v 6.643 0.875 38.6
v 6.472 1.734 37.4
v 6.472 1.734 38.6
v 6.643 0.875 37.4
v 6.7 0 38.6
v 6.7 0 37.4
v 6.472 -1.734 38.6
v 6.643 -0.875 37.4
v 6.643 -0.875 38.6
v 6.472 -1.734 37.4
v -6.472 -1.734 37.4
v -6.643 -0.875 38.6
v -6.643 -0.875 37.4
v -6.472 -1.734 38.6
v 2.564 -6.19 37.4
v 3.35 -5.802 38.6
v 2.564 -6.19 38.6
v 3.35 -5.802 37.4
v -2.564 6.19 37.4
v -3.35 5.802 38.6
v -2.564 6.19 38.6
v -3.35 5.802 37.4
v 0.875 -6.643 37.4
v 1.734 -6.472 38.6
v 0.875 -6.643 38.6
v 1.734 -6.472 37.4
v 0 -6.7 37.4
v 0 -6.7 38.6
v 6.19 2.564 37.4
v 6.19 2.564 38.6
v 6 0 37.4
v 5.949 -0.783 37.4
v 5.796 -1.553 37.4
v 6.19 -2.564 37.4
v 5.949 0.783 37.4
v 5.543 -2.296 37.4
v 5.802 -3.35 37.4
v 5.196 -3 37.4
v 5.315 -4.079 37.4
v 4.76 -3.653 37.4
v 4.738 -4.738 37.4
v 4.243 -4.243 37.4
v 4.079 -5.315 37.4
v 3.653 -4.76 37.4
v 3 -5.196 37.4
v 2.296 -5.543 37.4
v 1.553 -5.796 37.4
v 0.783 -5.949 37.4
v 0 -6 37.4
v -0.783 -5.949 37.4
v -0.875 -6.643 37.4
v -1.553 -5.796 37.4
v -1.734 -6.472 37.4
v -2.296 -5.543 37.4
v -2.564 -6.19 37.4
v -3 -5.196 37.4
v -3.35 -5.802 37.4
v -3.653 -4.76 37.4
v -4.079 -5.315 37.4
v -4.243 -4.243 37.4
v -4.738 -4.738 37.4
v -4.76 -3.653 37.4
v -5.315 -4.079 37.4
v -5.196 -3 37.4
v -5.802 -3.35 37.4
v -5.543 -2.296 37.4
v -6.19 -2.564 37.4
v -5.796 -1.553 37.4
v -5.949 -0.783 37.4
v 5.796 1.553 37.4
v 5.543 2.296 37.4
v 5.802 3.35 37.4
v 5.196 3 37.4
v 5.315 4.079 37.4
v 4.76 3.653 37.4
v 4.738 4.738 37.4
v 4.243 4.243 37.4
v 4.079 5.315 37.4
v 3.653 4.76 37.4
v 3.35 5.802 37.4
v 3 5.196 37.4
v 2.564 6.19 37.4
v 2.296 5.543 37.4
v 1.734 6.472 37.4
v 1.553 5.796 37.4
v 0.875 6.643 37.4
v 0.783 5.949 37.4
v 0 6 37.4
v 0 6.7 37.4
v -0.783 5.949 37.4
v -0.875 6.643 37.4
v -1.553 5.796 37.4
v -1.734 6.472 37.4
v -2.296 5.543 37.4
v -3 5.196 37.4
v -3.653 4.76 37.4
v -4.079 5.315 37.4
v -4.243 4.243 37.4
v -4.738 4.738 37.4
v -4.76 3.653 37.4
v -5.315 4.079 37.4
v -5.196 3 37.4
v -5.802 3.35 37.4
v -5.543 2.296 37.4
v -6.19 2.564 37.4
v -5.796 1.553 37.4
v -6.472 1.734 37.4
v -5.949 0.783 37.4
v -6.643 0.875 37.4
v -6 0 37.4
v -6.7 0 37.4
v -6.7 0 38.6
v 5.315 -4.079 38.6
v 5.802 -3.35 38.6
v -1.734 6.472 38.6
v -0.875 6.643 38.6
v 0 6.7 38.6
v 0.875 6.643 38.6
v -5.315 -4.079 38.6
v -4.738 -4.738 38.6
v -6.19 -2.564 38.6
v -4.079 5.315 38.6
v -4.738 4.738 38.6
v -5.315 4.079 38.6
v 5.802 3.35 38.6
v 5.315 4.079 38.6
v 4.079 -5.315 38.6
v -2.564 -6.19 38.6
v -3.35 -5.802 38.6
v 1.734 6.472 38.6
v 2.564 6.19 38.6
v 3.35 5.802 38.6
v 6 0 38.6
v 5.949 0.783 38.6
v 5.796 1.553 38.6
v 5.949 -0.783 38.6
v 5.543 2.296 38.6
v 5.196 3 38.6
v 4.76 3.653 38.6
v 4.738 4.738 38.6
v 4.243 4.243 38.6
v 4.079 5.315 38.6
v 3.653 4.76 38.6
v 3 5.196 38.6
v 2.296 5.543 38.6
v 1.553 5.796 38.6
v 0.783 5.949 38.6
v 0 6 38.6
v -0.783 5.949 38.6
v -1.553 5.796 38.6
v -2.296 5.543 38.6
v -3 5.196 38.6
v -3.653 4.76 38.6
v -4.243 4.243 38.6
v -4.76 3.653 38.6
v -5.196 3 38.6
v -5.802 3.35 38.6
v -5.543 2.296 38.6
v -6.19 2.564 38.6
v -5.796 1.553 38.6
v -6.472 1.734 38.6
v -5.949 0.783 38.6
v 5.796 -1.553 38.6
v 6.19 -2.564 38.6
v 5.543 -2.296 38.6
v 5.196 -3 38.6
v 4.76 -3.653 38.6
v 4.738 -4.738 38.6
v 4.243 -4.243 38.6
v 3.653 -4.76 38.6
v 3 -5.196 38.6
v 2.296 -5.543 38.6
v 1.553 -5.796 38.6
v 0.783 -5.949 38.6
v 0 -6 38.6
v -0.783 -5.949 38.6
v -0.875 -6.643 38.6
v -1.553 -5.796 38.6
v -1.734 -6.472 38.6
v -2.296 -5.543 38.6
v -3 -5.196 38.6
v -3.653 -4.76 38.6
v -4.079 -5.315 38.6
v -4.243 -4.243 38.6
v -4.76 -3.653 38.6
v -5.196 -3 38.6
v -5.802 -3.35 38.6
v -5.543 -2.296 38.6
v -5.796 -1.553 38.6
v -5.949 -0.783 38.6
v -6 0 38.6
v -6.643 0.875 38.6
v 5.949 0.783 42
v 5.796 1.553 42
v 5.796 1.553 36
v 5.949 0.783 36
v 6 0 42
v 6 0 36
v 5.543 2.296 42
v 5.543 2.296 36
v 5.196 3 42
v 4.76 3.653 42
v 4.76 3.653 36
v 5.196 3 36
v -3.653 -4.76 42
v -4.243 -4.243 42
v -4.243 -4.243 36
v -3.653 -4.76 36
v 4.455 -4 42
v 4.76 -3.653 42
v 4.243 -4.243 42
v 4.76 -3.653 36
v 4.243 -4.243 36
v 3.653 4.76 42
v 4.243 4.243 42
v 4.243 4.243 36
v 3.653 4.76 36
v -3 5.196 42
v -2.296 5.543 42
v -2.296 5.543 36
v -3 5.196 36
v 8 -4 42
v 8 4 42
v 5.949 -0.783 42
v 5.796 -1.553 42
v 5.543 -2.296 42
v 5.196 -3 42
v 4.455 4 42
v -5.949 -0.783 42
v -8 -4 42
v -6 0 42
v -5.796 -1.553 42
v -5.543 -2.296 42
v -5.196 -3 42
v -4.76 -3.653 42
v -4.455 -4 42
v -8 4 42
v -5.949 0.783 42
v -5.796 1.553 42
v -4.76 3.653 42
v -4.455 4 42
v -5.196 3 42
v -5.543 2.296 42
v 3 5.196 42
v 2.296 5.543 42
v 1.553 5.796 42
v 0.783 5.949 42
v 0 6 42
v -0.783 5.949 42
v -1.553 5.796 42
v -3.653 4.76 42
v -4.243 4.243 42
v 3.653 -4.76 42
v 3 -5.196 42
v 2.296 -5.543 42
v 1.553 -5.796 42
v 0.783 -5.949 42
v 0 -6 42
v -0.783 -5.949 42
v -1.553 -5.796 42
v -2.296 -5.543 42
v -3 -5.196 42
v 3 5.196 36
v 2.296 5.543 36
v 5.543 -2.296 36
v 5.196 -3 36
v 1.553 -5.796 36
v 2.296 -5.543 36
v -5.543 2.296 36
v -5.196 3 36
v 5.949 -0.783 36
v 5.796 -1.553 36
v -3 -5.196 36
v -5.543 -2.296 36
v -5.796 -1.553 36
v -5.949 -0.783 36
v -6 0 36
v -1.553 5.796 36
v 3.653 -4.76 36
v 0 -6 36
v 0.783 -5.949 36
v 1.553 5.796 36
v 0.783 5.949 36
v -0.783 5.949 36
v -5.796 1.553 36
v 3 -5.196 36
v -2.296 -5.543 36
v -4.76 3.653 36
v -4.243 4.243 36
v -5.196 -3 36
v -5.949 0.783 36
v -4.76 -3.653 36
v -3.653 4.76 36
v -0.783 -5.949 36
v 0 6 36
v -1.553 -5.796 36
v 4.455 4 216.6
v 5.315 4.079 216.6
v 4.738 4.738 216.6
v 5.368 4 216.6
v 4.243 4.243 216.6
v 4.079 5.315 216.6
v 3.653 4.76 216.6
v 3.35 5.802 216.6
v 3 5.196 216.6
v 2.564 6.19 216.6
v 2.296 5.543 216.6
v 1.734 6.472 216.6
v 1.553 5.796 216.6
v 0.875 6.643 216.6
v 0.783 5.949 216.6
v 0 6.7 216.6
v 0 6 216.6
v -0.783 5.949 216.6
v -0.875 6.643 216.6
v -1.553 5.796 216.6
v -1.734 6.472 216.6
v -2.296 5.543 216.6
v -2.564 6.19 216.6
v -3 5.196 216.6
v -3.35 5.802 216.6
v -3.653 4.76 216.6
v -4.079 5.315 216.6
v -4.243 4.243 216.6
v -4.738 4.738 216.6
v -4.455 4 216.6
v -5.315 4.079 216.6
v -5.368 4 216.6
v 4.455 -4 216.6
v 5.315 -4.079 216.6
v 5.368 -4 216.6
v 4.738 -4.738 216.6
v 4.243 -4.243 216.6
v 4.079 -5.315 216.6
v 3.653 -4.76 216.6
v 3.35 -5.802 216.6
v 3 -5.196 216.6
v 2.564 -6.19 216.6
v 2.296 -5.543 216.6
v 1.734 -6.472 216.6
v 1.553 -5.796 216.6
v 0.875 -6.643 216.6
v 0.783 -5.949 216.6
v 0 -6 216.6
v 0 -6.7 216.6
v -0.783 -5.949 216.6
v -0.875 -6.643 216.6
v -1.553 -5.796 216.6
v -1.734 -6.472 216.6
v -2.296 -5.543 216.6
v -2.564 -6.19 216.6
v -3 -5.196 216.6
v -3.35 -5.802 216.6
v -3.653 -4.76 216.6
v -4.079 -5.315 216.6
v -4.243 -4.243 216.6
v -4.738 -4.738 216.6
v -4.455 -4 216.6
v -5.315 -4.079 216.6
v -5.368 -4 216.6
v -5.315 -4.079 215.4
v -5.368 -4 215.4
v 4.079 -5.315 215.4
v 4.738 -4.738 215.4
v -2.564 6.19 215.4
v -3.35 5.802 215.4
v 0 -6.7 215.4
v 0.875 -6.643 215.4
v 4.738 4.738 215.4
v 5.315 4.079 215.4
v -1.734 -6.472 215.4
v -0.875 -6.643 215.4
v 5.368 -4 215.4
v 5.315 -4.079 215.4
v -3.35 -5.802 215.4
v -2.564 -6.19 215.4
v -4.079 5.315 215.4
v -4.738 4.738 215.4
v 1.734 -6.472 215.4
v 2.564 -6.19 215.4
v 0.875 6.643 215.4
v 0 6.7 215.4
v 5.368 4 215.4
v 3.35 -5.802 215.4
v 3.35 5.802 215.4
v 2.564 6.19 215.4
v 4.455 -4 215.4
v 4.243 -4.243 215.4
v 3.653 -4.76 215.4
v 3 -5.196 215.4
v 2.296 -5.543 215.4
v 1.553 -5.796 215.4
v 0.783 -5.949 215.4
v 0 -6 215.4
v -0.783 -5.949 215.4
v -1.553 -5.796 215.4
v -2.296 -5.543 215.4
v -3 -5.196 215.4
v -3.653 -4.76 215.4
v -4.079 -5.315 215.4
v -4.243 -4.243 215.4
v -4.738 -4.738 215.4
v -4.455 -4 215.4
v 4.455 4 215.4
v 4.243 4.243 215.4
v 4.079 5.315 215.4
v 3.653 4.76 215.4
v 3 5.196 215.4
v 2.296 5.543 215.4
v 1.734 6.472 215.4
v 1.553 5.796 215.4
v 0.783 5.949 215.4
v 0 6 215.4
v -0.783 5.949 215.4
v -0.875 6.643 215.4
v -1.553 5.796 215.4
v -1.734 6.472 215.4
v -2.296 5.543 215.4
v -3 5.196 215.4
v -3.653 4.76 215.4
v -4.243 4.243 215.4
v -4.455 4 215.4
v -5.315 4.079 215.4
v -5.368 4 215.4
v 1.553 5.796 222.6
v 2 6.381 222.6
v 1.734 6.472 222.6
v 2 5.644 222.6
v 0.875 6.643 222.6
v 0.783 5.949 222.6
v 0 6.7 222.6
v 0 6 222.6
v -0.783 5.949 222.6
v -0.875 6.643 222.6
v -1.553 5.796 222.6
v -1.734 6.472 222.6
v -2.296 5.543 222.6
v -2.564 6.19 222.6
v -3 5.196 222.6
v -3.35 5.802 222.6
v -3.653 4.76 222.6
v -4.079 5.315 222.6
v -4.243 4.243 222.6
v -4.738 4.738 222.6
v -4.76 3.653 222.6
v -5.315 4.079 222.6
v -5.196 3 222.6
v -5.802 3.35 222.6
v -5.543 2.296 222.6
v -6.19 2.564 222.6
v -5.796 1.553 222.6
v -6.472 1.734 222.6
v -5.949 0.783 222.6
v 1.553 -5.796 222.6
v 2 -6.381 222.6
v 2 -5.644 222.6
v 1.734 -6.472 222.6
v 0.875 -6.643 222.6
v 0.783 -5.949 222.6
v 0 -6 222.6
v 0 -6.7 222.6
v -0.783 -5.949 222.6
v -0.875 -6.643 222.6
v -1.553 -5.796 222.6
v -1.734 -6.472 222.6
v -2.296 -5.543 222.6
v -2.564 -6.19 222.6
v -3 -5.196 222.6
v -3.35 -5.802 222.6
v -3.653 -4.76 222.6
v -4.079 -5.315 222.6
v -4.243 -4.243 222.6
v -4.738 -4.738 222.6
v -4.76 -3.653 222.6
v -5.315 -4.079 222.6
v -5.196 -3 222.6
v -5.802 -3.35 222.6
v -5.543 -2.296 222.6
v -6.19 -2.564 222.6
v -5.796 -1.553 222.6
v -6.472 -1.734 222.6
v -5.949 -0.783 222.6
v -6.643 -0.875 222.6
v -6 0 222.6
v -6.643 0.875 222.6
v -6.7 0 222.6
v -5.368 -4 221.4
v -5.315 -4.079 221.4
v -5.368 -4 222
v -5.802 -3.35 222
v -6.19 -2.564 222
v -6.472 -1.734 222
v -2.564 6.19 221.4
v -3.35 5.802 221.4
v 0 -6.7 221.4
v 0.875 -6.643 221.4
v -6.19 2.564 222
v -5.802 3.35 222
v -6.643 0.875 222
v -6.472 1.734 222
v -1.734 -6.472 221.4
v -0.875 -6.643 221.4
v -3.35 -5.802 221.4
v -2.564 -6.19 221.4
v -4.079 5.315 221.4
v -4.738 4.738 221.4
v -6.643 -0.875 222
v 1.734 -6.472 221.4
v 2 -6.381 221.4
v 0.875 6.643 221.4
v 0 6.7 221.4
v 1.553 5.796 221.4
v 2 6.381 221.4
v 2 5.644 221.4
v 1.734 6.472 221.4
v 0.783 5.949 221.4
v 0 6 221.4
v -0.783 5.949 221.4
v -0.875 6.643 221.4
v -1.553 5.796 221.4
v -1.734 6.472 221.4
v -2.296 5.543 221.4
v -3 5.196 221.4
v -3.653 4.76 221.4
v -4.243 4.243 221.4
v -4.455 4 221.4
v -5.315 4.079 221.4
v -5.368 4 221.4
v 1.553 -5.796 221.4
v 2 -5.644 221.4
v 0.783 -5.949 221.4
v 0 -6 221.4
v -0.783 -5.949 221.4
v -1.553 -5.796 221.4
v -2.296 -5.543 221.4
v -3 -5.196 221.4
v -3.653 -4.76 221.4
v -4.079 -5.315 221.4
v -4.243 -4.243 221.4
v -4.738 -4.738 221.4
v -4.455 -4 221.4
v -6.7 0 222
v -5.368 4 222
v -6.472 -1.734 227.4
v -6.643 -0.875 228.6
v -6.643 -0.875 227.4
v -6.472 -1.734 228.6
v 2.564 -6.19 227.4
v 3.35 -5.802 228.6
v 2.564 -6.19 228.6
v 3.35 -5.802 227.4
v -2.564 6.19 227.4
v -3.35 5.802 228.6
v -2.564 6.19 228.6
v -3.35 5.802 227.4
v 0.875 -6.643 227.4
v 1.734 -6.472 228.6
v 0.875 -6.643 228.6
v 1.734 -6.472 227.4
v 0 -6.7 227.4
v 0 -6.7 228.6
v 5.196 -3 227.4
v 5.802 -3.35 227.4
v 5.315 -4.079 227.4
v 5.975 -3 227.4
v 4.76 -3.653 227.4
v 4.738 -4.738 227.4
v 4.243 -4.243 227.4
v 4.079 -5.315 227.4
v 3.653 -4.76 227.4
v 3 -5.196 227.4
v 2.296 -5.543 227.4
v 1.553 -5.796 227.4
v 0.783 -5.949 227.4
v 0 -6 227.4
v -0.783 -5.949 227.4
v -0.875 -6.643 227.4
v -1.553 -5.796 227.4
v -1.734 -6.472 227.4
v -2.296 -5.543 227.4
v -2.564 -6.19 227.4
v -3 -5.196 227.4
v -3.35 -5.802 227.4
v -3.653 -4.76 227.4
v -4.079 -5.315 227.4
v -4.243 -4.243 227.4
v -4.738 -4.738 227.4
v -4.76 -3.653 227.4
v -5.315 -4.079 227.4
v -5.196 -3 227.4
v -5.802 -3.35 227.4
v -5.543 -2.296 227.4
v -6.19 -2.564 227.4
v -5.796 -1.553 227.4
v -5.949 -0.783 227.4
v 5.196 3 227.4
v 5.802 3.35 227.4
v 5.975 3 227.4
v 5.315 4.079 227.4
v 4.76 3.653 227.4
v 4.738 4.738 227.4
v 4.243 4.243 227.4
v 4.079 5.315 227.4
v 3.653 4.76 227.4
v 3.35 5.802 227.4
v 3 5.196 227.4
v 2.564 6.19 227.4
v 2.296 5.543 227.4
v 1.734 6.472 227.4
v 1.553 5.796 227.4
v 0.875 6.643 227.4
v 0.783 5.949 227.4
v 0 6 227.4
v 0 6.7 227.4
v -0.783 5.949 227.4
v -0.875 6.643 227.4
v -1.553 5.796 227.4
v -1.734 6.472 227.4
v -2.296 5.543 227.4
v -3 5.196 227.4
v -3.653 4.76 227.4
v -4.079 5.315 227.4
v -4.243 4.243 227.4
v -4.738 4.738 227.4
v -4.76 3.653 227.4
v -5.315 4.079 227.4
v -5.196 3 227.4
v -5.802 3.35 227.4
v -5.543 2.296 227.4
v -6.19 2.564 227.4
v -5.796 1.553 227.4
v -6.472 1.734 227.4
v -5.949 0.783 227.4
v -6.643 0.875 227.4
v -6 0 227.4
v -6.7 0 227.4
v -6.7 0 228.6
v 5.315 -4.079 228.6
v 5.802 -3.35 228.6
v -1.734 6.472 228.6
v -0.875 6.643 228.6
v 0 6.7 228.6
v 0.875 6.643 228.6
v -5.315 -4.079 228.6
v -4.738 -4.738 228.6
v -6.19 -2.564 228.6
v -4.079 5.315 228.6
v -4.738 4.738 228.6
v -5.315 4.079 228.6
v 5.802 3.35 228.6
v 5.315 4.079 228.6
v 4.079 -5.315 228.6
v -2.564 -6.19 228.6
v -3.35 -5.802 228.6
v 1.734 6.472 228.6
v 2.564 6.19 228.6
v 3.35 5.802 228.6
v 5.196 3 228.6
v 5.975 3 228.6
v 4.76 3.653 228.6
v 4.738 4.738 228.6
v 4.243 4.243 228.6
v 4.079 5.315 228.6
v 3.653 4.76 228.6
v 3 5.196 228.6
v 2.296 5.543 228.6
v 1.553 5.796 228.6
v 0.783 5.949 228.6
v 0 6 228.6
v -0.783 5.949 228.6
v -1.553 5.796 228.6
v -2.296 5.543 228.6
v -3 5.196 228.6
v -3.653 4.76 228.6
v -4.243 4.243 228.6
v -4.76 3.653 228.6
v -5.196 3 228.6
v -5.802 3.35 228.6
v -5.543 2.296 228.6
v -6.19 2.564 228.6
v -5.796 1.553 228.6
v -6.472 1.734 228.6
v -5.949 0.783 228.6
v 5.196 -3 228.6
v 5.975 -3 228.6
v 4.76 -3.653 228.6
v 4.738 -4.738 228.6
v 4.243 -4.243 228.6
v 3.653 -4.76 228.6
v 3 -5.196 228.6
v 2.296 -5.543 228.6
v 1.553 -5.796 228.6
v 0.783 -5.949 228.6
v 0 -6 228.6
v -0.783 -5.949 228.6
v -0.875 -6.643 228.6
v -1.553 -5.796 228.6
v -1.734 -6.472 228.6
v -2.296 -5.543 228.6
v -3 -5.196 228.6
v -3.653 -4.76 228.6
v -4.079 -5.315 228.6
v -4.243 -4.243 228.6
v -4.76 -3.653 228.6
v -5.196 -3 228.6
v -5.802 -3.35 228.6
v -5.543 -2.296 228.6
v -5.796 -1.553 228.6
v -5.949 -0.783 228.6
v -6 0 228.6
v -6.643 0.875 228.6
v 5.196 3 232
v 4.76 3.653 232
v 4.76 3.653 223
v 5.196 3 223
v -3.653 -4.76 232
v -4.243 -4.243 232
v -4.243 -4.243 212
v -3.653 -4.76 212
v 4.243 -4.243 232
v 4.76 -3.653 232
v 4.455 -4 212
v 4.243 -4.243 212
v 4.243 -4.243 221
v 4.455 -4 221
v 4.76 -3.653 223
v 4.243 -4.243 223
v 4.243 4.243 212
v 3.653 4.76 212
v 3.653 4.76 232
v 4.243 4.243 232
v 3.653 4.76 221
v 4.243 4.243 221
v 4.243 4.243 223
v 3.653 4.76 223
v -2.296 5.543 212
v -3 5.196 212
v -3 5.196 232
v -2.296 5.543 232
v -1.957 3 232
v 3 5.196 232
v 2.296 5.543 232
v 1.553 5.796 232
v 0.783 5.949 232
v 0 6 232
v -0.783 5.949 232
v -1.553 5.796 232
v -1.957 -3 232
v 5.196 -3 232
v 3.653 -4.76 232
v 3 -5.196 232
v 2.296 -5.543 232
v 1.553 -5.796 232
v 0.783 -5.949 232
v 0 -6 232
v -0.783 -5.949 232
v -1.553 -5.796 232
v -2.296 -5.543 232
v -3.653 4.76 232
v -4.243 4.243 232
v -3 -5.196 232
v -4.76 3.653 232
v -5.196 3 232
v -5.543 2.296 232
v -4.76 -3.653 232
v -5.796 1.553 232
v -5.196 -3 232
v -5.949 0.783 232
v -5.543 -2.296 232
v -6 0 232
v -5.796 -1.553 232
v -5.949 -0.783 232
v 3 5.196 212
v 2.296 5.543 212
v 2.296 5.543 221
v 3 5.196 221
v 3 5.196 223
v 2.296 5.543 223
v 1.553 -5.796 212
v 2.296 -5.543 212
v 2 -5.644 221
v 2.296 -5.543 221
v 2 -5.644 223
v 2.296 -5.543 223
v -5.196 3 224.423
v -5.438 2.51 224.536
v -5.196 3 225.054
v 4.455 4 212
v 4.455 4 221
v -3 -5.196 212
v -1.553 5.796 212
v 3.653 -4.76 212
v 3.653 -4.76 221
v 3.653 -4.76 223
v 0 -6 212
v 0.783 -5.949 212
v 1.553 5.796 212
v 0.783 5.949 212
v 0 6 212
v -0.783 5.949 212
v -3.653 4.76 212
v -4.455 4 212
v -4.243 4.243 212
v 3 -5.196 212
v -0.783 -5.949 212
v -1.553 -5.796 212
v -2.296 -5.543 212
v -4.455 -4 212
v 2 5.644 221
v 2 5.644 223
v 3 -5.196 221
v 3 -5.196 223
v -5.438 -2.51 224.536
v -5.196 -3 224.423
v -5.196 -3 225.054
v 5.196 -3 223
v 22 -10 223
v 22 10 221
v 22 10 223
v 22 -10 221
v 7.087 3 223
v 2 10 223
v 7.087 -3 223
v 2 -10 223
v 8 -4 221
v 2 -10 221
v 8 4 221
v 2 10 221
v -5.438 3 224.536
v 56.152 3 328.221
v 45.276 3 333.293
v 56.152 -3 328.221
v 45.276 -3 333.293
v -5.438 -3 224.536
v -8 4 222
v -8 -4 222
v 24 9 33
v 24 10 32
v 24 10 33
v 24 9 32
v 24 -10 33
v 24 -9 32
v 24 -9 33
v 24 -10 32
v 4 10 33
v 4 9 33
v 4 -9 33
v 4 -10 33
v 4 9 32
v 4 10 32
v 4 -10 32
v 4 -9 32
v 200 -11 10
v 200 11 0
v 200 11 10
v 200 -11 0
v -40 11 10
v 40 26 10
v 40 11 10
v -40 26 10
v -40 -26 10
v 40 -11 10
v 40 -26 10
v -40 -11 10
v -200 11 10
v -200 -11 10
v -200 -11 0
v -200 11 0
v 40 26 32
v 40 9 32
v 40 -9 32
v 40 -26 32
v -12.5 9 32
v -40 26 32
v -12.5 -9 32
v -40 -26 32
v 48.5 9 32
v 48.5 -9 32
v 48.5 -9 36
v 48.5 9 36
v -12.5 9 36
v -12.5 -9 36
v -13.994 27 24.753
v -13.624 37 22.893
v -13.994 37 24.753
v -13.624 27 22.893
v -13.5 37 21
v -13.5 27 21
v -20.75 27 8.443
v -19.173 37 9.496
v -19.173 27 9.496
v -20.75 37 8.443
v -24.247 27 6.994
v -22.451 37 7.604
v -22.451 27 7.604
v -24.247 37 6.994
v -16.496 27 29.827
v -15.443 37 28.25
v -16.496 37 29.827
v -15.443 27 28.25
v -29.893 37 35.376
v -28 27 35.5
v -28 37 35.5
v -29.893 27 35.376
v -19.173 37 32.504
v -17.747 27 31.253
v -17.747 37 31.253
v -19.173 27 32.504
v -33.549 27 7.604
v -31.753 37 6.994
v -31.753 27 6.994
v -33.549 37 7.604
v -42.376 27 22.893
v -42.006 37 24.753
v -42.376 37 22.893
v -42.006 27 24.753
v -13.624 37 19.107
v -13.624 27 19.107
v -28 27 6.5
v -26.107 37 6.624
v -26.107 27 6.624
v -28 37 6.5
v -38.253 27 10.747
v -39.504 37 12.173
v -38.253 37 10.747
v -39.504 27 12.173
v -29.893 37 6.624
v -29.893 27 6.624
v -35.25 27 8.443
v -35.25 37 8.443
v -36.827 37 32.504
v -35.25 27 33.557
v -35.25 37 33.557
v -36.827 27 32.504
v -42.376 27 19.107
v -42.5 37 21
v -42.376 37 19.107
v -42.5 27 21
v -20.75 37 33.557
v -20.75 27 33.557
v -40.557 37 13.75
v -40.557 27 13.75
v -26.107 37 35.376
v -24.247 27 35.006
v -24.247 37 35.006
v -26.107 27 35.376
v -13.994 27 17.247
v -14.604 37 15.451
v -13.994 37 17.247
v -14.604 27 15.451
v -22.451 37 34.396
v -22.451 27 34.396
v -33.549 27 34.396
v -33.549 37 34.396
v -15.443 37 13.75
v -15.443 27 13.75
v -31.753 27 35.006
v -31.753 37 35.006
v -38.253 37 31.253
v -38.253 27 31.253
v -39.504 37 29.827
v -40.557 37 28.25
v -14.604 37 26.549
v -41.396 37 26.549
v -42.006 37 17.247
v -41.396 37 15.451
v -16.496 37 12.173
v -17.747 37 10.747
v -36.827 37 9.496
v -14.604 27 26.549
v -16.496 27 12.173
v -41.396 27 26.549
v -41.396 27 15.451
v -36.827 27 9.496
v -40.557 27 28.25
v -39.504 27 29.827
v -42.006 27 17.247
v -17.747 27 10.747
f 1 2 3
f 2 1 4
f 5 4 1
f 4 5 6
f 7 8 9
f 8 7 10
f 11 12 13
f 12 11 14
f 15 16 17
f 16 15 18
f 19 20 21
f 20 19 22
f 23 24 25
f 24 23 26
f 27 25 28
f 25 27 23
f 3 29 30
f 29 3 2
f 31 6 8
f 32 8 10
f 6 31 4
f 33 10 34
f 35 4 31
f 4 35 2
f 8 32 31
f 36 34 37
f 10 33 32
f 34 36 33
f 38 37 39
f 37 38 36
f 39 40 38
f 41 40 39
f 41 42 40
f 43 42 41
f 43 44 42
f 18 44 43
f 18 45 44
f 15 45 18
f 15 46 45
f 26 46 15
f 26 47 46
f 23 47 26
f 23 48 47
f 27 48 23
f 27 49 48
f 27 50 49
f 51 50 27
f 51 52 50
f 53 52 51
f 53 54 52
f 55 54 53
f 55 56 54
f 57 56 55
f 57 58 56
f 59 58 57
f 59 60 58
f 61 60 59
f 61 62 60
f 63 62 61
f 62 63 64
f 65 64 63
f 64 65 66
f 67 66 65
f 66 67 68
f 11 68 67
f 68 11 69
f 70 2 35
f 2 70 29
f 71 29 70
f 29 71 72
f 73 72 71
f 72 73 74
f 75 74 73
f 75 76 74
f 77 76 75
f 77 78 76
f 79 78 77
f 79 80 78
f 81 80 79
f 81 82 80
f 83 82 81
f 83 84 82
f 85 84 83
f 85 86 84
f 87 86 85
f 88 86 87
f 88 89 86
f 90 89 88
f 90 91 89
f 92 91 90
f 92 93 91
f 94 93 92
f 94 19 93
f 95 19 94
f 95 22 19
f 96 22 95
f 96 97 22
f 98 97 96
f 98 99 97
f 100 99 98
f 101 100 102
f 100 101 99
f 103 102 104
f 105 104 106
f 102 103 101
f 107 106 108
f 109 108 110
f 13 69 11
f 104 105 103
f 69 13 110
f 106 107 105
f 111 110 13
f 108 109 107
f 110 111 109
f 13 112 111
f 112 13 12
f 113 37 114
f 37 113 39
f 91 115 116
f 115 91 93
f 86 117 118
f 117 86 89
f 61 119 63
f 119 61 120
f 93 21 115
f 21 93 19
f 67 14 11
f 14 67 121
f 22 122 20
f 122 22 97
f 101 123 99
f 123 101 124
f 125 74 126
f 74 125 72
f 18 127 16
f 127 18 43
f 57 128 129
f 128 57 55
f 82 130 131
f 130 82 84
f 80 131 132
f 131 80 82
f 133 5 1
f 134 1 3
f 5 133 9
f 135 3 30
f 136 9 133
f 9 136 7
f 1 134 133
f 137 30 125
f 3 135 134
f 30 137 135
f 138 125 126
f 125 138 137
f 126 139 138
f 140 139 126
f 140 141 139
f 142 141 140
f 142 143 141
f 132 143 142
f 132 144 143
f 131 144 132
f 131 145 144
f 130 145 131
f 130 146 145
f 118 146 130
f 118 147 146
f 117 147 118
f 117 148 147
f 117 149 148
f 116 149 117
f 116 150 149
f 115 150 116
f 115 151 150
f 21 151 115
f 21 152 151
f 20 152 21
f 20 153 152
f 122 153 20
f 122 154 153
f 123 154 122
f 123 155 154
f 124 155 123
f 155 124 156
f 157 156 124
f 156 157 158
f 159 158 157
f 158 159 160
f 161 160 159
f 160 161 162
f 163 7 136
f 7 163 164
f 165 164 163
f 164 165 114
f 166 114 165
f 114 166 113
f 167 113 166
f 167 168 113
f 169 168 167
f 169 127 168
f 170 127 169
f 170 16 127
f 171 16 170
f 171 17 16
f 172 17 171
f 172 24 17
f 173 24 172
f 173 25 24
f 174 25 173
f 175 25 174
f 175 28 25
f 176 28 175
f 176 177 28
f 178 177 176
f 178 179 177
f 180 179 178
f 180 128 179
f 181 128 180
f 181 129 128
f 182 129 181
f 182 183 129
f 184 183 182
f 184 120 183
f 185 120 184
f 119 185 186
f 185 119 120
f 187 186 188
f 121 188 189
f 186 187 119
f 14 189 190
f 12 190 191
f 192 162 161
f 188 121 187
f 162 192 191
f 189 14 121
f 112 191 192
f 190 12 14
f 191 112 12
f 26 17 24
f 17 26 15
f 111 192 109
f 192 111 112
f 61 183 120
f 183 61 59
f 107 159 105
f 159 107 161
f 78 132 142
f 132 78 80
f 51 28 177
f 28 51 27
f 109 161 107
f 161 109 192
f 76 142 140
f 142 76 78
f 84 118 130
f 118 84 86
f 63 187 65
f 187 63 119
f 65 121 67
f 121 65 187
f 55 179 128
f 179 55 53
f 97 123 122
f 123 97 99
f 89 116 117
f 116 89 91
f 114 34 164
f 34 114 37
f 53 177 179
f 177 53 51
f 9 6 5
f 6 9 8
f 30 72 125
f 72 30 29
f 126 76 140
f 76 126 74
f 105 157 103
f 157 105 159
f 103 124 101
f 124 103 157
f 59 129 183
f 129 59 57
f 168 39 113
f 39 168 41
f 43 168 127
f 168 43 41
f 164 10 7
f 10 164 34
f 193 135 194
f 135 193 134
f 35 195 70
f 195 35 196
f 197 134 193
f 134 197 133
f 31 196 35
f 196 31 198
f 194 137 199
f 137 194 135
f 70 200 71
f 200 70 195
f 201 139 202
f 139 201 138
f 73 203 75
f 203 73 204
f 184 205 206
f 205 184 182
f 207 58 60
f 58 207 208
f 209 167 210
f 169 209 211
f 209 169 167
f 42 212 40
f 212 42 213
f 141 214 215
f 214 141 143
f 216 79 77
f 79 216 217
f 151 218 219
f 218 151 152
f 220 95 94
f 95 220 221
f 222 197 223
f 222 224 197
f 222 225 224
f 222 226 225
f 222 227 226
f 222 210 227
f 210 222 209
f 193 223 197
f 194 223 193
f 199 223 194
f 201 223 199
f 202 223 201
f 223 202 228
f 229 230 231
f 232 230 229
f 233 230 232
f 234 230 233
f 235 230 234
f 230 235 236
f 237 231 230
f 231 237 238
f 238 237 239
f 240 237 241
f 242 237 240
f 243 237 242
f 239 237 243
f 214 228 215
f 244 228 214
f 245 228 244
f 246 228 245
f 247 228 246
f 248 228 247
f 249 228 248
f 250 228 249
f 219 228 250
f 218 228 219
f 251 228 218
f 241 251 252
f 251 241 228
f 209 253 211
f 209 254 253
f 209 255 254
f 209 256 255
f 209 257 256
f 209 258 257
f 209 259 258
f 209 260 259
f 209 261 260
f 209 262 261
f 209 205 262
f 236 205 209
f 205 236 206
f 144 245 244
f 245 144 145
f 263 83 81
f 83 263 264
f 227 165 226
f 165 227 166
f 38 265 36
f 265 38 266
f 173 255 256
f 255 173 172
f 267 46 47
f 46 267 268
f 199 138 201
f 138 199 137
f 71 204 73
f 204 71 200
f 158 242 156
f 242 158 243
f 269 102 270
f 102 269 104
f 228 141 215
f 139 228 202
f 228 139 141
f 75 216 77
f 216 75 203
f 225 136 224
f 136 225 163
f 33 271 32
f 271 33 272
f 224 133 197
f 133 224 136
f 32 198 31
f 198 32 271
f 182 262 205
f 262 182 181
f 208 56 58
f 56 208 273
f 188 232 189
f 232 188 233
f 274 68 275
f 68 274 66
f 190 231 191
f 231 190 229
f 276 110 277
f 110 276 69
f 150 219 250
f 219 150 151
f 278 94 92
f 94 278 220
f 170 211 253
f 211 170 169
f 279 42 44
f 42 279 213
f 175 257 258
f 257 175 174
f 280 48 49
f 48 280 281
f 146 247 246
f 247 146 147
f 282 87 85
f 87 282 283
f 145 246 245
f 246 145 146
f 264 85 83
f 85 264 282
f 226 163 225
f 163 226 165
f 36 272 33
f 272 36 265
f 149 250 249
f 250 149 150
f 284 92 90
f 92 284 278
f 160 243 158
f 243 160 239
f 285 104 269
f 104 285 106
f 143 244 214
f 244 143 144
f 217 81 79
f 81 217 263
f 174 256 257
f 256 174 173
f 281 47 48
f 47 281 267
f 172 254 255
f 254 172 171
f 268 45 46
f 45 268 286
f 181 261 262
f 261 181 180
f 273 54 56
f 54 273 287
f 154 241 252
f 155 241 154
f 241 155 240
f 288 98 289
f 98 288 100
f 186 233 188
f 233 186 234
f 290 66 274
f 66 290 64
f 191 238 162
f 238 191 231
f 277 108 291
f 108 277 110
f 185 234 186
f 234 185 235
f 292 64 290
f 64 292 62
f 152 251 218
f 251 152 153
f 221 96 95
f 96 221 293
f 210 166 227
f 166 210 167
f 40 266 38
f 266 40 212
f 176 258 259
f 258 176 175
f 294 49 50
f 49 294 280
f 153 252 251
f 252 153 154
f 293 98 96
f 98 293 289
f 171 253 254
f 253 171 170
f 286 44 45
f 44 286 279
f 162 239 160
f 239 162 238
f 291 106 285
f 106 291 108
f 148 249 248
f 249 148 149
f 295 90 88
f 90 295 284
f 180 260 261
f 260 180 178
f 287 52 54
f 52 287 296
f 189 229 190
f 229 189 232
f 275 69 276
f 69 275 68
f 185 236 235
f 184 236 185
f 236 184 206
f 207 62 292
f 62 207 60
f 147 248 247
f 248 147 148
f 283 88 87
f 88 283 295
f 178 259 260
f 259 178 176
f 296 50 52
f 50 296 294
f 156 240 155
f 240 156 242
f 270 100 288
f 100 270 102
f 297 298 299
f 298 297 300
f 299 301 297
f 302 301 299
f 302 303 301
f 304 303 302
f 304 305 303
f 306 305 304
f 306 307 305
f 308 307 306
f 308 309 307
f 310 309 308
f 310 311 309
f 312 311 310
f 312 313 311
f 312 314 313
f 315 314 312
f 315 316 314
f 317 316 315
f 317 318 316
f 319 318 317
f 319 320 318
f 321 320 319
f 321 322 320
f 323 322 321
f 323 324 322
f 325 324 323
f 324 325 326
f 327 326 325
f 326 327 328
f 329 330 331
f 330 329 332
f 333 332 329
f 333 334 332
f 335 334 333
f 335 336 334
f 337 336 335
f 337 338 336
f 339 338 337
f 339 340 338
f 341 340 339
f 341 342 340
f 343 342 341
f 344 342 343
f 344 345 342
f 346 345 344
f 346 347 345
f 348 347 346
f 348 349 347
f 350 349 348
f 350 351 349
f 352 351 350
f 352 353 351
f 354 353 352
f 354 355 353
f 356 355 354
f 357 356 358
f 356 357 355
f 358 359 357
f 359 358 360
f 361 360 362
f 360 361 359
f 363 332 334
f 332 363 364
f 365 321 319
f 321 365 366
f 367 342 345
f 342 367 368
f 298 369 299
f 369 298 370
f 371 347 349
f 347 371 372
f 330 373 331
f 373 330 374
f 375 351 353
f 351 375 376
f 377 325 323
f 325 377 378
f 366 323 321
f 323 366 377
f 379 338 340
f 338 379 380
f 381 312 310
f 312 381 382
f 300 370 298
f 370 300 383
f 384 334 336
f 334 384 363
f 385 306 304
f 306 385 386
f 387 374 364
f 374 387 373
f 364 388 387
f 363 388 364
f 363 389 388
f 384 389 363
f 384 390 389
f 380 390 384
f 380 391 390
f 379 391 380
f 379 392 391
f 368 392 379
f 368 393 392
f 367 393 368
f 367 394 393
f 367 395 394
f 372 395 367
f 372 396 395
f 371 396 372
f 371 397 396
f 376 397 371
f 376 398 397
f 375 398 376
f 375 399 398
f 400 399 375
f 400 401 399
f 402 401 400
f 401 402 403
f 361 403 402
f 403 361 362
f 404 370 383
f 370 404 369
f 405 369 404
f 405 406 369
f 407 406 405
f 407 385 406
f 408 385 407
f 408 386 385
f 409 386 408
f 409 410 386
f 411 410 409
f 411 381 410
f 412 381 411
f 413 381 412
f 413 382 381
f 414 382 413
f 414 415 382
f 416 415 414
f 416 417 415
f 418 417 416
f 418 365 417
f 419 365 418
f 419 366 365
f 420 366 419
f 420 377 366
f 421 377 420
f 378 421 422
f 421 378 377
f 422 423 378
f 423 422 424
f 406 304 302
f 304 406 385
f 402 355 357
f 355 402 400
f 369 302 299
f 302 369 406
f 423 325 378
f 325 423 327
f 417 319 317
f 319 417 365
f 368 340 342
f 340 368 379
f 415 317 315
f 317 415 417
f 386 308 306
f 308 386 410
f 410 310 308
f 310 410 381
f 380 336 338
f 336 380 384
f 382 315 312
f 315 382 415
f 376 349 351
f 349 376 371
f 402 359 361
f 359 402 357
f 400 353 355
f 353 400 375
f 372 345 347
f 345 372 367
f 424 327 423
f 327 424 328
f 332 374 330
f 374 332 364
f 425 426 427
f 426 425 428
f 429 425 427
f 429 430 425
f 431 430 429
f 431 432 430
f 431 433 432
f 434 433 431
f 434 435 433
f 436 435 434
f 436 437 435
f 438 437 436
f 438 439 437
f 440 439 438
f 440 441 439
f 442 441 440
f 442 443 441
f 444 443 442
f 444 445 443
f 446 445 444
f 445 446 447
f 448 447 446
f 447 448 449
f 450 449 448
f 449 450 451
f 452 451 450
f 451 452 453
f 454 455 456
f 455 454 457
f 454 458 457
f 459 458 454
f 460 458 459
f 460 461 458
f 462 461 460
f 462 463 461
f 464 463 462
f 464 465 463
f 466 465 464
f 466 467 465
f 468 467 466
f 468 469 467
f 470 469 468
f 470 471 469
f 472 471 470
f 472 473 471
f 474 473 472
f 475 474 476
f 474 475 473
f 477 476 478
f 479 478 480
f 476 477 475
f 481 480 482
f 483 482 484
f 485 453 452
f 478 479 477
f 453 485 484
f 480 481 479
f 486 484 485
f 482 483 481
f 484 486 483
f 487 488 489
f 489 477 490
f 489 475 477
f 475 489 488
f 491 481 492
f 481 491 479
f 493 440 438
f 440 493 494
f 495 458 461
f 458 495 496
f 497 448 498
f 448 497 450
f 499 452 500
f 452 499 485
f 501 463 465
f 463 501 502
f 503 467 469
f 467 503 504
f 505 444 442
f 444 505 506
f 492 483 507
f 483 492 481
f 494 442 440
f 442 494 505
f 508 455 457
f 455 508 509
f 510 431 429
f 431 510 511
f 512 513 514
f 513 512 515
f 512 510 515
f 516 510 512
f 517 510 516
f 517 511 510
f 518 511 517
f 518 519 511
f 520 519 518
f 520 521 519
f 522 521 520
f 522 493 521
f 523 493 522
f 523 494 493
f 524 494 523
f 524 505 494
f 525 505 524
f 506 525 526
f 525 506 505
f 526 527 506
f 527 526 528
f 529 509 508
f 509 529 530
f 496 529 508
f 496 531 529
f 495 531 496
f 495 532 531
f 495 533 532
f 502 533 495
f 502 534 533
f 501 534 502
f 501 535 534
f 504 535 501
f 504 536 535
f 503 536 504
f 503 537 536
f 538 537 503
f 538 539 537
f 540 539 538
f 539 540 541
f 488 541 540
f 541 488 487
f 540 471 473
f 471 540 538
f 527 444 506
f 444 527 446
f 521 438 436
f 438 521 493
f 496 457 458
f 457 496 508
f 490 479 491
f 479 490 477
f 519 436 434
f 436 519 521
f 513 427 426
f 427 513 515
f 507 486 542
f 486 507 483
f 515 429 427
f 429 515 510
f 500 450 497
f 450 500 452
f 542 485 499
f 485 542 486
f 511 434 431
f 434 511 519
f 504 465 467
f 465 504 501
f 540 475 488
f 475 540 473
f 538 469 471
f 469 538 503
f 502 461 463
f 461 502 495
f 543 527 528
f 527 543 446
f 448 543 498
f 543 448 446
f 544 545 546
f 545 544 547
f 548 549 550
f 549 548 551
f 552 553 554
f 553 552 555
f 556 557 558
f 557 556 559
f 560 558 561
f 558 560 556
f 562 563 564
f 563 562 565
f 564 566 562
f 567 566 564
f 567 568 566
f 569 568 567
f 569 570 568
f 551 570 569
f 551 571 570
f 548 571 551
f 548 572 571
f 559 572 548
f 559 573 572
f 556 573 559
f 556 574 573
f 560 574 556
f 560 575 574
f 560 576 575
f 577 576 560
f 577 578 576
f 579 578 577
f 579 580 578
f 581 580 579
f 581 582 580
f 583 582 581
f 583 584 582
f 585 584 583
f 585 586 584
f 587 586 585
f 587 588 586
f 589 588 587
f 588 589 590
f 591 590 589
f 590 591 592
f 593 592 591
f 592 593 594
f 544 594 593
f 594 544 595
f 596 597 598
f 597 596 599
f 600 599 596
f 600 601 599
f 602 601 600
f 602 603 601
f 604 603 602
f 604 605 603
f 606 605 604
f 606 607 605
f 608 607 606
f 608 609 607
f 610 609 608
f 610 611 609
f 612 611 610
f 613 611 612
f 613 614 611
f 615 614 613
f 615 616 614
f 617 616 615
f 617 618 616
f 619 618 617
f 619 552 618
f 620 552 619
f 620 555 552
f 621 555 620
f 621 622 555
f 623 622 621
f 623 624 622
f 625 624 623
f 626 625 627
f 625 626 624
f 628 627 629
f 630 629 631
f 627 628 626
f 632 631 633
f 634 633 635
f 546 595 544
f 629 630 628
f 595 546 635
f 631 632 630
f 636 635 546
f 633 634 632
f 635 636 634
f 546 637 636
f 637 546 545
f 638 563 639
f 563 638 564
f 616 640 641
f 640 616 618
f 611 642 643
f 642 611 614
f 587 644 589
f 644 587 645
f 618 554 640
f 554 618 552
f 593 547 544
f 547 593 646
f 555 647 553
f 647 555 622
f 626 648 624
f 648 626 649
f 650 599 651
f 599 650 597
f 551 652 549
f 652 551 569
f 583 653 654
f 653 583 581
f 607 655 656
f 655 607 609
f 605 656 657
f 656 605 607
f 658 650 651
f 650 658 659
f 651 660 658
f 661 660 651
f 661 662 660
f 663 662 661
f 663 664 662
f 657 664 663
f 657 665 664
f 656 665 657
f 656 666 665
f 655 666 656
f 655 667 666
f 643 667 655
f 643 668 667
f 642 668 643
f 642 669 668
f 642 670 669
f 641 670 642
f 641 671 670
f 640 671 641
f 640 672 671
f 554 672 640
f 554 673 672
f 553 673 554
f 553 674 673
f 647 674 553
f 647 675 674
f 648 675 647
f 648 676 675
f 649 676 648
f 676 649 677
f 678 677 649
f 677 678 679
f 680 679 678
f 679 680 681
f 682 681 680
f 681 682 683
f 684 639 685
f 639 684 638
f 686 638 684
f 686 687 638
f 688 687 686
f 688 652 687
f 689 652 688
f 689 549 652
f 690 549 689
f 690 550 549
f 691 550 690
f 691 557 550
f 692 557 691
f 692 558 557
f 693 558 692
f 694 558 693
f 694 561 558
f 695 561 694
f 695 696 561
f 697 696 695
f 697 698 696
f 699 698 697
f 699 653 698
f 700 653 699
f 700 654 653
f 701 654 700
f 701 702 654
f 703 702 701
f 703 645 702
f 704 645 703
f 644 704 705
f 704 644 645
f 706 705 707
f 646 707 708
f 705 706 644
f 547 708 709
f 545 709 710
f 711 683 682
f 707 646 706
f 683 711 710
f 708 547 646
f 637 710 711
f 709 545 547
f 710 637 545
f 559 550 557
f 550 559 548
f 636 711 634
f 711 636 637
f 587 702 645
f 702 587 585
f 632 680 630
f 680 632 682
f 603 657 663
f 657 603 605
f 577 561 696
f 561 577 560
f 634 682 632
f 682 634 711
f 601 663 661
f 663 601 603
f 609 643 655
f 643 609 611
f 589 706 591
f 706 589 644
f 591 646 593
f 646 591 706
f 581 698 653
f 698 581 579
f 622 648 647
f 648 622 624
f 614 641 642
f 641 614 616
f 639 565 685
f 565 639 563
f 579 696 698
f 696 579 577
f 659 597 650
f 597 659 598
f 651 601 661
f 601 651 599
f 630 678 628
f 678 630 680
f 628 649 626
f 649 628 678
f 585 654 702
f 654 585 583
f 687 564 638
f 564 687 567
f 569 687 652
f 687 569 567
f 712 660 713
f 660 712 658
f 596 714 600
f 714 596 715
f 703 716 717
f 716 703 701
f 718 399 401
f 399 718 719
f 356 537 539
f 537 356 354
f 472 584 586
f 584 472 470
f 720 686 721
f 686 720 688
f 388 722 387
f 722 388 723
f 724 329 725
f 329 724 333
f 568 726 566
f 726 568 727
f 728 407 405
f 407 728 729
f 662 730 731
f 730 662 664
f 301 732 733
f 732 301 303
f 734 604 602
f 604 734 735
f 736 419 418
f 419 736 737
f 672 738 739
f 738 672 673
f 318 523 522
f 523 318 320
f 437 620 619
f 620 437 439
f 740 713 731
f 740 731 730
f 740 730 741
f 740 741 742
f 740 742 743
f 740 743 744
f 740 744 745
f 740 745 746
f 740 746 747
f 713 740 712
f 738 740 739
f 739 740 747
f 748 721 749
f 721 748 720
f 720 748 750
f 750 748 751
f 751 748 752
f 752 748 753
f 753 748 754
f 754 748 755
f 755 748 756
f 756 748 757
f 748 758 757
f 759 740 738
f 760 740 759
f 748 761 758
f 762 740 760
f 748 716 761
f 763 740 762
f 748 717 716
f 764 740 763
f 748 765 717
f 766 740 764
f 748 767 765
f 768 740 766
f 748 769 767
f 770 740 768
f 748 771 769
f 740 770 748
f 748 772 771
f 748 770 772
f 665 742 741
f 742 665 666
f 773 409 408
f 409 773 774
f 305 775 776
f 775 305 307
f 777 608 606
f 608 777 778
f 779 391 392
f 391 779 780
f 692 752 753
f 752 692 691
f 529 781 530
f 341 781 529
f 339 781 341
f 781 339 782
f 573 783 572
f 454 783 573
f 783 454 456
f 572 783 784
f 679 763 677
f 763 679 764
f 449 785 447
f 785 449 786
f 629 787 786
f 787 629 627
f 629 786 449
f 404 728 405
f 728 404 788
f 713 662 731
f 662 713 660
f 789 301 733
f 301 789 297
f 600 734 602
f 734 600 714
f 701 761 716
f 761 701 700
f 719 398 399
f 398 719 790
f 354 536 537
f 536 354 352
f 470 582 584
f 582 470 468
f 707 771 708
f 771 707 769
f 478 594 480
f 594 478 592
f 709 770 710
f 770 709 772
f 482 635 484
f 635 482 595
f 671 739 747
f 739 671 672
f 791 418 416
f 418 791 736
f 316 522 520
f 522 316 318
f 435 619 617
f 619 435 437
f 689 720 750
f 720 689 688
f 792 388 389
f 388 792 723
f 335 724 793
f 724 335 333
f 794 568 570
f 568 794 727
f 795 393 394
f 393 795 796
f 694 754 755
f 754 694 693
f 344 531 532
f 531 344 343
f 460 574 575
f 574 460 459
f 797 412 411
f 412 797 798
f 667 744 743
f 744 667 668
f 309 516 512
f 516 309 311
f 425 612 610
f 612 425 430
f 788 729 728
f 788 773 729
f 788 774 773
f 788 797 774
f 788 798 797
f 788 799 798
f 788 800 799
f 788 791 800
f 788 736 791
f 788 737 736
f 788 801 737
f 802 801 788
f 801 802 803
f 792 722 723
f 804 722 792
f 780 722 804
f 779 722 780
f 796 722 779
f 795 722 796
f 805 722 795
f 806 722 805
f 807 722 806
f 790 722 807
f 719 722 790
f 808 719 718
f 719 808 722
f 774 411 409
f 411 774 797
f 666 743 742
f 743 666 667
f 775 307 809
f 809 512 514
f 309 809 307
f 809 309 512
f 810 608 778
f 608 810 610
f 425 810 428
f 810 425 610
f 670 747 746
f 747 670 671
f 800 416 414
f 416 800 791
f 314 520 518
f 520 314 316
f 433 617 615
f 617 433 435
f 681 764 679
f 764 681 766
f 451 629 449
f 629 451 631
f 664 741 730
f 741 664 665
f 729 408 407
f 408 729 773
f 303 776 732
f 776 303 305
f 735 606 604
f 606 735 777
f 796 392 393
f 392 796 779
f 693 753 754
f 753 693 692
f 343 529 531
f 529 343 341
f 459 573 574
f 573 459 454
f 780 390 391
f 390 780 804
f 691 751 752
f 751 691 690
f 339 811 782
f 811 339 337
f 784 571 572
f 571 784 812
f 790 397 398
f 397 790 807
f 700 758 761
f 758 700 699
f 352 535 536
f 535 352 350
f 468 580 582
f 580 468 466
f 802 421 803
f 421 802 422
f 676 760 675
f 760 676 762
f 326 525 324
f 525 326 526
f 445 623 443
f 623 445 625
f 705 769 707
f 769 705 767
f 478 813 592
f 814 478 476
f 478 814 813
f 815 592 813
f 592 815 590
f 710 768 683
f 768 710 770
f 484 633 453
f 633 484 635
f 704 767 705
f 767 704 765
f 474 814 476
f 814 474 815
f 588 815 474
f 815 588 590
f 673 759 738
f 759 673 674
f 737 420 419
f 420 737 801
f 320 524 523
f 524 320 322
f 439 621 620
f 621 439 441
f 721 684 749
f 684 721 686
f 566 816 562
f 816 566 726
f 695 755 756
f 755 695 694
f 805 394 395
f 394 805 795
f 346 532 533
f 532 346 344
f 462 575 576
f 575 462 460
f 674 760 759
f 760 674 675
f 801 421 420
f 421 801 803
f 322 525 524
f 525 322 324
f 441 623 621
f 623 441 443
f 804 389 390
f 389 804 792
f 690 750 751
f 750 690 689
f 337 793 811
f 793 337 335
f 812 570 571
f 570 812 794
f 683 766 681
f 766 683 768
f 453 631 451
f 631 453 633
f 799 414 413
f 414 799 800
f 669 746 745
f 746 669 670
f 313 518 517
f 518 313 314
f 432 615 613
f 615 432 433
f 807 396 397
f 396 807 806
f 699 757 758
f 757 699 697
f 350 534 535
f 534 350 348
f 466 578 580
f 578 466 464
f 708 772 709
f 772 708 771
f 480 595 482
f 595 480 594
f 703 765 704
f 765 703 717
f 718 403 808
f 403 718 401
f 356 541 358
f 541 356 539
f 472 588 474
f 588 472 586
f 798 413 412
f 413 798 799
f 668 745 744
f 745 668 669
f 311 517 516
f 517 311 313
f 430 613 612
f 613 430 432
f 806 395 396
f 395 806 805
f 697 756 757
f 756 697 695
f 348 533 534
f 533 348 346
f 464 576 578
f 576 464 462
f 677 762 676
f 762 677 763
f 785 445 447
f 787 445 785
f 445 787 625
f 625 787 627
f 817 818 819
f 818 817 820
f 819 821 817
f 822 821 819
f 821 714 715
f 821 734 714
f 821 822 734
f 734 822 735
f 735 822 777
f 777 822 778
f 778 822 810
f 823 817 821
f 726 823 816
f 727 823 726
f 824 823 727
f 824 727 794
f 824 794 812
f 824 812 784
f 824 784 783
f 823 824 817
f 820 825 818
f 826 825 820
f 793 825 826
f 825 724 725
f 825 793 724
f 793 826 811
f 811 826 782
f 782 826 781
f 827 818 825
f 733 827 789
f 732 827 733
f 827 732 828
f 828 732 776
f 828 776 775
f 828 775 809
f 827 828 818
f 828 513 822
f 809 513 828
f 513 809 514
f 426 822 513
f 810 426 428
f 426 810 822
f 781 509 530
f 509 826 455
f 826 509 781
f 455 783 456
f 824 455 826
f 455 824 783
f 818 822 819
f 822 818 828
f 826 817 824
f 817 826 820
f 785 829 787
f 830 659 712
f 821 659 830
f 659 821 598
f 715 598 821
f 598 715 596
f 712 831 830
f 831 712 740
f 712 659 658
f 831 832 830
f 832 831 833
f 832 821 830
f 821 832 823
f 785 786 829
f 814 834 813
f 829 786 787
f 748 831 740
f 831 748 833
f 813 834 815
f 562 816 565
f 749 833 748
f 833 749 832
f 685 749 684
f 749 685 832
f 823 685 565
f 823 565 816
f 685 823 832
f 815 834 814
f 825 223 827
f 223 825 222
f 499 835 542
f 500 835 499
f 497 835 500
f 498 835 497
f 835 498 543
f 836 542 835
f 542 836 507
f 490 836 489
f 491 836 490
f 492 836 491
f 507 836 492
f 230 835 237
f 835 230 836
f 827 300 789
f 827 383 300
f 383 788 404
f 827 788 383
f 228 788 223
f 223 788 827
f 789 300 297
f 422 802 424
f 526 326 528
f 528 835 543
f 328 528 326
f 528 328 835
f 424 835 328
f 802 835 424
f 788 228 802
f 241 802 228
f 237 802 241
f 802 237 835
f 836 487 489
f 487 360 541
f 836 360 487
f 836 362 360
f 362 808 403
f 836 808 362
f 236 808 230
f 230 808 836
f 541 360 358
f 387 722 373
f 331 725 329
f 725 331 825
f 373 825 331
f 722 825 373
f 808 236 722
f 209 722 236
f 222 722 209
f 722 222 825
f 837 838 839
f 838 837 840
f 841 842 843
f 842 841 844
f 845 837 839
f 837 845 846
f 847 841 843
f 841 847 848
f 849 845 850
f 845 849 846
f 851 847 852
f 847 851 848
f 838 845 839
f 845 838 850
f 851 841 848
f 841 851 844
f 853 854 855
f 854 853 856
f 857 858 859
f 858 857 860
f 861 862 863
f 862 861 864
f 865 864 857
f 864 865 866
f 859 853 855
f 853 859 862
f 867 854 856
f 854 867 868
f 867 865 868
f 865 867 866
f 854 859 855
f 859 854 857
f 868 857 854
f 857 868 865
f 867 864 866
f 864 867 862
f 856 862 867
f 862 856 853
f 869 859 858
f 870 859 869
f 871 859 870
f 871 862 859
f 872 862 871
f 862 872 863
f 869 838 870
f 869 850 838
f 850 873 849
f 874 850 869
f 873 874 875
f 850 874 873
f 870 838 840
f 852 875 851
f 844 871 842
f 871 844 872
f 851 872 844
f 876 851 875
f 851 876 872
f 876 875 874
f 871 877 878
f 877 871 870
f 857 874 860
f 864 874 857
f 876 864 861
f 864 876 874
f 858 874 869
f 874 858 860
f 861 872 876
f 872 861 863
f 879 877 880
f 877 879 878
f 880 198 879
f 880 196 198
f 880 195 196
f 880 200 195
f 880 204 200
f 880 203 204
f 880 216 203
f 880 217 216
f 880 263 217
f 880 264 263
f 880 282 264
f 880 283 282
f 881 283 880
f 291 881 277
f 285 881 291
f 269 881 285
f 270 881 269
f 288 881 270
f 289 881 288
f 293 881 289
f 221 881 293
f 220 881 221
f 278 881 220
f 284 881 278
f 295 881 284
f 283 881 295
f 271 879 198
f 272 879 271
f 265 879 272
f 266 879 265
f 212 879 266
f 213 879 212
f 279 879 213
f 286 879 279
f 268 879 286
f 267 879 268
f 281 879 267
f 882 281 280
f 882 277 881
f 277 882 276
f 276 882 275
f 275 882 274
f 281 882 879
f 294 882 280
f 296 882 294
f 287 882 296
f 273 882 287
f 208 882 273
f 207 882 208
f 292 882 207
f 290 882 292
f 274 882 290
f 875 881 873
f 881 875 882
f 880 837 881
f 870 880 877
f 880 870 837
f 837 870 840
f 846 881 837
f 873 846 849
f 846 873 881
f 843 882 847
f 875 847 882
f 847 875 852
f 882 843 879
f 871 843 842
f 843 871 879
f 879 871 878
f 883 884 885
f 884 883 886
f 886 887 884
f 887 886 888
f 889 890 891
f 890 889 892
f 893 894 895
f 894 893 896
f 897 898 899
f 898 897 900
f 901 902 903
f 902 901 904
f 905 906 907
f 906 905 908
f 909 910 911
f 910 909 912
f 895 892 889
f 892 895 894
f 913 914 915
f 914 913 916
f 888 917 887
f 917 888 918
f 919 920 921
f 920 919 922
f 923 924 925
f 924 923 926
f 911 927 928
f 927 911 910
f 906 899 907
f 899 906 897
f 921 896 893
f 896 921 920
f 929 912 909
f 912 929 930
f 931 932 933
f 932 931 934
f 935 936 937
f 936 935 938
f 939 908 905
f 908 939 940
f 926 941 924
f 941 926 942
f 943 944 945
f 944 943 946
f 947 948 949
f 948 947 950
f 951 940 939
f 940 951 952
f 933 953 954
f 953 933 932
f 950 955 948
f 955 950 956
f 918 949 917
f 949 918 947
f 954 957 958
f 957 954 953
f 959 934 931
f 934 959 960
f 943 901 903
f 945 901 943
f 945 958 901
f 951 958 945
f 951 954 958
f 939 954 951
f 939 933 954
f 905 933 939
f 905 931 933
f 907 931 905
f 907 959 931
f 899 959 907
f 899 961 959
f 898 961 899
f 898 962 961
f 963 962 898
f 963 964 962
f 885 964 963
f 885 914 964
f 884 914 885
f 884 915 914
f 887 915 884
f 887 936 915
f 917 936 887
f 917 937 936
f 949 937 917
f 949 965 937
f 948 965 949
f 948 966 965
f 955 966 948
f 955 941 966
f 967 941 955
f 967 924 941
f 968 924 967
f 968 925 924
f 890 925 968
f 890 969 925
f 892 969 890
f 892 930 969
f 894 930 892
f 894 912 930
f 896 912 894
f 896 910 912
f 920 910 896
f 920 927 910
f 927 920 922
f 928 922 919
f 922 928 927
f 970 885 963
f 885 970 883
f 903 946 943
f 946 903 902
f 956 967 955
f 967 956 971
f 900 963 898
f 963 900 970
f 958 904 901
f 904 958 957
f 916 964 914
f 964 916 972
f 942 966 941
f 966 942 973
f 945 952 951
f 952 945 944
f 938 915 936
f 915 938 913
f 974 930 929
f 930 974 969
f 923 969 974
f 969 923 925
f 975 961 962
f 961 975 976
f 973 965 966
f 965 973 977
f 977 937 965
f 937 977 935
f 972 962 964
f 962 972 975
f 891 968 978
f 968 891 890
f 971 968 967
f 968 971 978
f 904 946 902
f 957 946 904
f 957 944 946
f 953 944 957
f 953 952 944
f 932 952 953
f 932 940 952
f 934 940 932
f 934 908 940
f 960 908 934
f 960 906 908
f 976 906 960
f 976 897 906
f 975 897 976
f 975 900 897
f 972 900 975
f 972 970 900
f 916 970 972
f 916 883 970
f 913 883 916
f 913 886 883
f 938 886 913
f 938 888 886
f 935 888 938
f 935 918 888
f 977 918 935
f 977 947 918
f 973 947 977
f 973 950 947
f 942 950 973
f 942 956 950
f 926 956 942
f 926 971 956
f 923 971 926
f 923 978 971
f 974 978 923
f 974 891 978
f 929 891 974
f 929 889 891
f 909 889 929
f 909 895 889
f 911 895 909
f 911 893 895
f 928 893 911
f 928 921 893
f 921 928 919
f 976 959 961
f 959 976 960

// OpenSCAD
// Cart-double pendulum desktop assembly
// Units: millimeters. Open in OpenSCAD or any SCAD-compatible CAD.
// Matches the interactive viewer on the Supply Keychain page.

$fn = 48;

rail_len = 400;
rail_w = 22;
rail_h = 10;

cart_l = 80;
cart_w = 52;
cart_h = 22;

link1_l = 180;
link1_w = 16;
link1_t = 8;

link2_l = 120;
link2_w = 12;
link2_t = 6;

module rail() {
  color("#9aa7b5")
    translate([0, 0, rail_h/2])
      cube([rail_len, rail_w, rail_h], center=true);
}

module cart() {
  color("#d8dee8")
    translate([0, 0, rail_h + cart_h/2])
      cube([cart_l, cart_w, cart_h], center=true);
}

module teensy() {
  color("#1f7a3a")
    translate([18, 0, rail_h + cart_h + 2])
      cube([61, 18, 4], center=true);
}

module amt102() {
  color("#2b2b2b")
    translate([-28, cart_w/2 + 6, rail_h + cart_h/2])
      rotate([90, 0, 0])
        cylinder(h=10, d=29, center=true);
}

module slip_ring() {
  color("#c9a227") {
    cylinder(h=20, d=12, center=true);
    for (z = [-6, 0, 6])
      translate([0, 0, z])
        cylinder(h=1.2, d=13.4, center=true);
  }
}

module as5047p() {
  color("#163024")
    cube([20, 20, 2], center=true);
}

module link1() {
  color("#7f8b99")
    translate([0, 0, link1_l/2])
      cube([link1_w, link1_t, link1_l], center=true);
}

module link2() {
  color("#a3adb8")
    translate([0, 0, link2_l/2])
      cube([link2_w, link2_t, link2_l], center=true);
}

module assembly() {
  rail();
  cart();
  teensy();
  amt102();

  translate([0, 0, rail_h + cart_h]) {
    slip_ring();
    translate([14, 0, 0]) as5047p();
    translate([0, 0, 10]) {
      link1();
      translate([0, 0, link1_l]) {
        slip_ring();
        translate([12, 0, 0]) as5047p();
        rotate([0, 25, 0])
          link2();
      }
    }
  }
}

assembly();
